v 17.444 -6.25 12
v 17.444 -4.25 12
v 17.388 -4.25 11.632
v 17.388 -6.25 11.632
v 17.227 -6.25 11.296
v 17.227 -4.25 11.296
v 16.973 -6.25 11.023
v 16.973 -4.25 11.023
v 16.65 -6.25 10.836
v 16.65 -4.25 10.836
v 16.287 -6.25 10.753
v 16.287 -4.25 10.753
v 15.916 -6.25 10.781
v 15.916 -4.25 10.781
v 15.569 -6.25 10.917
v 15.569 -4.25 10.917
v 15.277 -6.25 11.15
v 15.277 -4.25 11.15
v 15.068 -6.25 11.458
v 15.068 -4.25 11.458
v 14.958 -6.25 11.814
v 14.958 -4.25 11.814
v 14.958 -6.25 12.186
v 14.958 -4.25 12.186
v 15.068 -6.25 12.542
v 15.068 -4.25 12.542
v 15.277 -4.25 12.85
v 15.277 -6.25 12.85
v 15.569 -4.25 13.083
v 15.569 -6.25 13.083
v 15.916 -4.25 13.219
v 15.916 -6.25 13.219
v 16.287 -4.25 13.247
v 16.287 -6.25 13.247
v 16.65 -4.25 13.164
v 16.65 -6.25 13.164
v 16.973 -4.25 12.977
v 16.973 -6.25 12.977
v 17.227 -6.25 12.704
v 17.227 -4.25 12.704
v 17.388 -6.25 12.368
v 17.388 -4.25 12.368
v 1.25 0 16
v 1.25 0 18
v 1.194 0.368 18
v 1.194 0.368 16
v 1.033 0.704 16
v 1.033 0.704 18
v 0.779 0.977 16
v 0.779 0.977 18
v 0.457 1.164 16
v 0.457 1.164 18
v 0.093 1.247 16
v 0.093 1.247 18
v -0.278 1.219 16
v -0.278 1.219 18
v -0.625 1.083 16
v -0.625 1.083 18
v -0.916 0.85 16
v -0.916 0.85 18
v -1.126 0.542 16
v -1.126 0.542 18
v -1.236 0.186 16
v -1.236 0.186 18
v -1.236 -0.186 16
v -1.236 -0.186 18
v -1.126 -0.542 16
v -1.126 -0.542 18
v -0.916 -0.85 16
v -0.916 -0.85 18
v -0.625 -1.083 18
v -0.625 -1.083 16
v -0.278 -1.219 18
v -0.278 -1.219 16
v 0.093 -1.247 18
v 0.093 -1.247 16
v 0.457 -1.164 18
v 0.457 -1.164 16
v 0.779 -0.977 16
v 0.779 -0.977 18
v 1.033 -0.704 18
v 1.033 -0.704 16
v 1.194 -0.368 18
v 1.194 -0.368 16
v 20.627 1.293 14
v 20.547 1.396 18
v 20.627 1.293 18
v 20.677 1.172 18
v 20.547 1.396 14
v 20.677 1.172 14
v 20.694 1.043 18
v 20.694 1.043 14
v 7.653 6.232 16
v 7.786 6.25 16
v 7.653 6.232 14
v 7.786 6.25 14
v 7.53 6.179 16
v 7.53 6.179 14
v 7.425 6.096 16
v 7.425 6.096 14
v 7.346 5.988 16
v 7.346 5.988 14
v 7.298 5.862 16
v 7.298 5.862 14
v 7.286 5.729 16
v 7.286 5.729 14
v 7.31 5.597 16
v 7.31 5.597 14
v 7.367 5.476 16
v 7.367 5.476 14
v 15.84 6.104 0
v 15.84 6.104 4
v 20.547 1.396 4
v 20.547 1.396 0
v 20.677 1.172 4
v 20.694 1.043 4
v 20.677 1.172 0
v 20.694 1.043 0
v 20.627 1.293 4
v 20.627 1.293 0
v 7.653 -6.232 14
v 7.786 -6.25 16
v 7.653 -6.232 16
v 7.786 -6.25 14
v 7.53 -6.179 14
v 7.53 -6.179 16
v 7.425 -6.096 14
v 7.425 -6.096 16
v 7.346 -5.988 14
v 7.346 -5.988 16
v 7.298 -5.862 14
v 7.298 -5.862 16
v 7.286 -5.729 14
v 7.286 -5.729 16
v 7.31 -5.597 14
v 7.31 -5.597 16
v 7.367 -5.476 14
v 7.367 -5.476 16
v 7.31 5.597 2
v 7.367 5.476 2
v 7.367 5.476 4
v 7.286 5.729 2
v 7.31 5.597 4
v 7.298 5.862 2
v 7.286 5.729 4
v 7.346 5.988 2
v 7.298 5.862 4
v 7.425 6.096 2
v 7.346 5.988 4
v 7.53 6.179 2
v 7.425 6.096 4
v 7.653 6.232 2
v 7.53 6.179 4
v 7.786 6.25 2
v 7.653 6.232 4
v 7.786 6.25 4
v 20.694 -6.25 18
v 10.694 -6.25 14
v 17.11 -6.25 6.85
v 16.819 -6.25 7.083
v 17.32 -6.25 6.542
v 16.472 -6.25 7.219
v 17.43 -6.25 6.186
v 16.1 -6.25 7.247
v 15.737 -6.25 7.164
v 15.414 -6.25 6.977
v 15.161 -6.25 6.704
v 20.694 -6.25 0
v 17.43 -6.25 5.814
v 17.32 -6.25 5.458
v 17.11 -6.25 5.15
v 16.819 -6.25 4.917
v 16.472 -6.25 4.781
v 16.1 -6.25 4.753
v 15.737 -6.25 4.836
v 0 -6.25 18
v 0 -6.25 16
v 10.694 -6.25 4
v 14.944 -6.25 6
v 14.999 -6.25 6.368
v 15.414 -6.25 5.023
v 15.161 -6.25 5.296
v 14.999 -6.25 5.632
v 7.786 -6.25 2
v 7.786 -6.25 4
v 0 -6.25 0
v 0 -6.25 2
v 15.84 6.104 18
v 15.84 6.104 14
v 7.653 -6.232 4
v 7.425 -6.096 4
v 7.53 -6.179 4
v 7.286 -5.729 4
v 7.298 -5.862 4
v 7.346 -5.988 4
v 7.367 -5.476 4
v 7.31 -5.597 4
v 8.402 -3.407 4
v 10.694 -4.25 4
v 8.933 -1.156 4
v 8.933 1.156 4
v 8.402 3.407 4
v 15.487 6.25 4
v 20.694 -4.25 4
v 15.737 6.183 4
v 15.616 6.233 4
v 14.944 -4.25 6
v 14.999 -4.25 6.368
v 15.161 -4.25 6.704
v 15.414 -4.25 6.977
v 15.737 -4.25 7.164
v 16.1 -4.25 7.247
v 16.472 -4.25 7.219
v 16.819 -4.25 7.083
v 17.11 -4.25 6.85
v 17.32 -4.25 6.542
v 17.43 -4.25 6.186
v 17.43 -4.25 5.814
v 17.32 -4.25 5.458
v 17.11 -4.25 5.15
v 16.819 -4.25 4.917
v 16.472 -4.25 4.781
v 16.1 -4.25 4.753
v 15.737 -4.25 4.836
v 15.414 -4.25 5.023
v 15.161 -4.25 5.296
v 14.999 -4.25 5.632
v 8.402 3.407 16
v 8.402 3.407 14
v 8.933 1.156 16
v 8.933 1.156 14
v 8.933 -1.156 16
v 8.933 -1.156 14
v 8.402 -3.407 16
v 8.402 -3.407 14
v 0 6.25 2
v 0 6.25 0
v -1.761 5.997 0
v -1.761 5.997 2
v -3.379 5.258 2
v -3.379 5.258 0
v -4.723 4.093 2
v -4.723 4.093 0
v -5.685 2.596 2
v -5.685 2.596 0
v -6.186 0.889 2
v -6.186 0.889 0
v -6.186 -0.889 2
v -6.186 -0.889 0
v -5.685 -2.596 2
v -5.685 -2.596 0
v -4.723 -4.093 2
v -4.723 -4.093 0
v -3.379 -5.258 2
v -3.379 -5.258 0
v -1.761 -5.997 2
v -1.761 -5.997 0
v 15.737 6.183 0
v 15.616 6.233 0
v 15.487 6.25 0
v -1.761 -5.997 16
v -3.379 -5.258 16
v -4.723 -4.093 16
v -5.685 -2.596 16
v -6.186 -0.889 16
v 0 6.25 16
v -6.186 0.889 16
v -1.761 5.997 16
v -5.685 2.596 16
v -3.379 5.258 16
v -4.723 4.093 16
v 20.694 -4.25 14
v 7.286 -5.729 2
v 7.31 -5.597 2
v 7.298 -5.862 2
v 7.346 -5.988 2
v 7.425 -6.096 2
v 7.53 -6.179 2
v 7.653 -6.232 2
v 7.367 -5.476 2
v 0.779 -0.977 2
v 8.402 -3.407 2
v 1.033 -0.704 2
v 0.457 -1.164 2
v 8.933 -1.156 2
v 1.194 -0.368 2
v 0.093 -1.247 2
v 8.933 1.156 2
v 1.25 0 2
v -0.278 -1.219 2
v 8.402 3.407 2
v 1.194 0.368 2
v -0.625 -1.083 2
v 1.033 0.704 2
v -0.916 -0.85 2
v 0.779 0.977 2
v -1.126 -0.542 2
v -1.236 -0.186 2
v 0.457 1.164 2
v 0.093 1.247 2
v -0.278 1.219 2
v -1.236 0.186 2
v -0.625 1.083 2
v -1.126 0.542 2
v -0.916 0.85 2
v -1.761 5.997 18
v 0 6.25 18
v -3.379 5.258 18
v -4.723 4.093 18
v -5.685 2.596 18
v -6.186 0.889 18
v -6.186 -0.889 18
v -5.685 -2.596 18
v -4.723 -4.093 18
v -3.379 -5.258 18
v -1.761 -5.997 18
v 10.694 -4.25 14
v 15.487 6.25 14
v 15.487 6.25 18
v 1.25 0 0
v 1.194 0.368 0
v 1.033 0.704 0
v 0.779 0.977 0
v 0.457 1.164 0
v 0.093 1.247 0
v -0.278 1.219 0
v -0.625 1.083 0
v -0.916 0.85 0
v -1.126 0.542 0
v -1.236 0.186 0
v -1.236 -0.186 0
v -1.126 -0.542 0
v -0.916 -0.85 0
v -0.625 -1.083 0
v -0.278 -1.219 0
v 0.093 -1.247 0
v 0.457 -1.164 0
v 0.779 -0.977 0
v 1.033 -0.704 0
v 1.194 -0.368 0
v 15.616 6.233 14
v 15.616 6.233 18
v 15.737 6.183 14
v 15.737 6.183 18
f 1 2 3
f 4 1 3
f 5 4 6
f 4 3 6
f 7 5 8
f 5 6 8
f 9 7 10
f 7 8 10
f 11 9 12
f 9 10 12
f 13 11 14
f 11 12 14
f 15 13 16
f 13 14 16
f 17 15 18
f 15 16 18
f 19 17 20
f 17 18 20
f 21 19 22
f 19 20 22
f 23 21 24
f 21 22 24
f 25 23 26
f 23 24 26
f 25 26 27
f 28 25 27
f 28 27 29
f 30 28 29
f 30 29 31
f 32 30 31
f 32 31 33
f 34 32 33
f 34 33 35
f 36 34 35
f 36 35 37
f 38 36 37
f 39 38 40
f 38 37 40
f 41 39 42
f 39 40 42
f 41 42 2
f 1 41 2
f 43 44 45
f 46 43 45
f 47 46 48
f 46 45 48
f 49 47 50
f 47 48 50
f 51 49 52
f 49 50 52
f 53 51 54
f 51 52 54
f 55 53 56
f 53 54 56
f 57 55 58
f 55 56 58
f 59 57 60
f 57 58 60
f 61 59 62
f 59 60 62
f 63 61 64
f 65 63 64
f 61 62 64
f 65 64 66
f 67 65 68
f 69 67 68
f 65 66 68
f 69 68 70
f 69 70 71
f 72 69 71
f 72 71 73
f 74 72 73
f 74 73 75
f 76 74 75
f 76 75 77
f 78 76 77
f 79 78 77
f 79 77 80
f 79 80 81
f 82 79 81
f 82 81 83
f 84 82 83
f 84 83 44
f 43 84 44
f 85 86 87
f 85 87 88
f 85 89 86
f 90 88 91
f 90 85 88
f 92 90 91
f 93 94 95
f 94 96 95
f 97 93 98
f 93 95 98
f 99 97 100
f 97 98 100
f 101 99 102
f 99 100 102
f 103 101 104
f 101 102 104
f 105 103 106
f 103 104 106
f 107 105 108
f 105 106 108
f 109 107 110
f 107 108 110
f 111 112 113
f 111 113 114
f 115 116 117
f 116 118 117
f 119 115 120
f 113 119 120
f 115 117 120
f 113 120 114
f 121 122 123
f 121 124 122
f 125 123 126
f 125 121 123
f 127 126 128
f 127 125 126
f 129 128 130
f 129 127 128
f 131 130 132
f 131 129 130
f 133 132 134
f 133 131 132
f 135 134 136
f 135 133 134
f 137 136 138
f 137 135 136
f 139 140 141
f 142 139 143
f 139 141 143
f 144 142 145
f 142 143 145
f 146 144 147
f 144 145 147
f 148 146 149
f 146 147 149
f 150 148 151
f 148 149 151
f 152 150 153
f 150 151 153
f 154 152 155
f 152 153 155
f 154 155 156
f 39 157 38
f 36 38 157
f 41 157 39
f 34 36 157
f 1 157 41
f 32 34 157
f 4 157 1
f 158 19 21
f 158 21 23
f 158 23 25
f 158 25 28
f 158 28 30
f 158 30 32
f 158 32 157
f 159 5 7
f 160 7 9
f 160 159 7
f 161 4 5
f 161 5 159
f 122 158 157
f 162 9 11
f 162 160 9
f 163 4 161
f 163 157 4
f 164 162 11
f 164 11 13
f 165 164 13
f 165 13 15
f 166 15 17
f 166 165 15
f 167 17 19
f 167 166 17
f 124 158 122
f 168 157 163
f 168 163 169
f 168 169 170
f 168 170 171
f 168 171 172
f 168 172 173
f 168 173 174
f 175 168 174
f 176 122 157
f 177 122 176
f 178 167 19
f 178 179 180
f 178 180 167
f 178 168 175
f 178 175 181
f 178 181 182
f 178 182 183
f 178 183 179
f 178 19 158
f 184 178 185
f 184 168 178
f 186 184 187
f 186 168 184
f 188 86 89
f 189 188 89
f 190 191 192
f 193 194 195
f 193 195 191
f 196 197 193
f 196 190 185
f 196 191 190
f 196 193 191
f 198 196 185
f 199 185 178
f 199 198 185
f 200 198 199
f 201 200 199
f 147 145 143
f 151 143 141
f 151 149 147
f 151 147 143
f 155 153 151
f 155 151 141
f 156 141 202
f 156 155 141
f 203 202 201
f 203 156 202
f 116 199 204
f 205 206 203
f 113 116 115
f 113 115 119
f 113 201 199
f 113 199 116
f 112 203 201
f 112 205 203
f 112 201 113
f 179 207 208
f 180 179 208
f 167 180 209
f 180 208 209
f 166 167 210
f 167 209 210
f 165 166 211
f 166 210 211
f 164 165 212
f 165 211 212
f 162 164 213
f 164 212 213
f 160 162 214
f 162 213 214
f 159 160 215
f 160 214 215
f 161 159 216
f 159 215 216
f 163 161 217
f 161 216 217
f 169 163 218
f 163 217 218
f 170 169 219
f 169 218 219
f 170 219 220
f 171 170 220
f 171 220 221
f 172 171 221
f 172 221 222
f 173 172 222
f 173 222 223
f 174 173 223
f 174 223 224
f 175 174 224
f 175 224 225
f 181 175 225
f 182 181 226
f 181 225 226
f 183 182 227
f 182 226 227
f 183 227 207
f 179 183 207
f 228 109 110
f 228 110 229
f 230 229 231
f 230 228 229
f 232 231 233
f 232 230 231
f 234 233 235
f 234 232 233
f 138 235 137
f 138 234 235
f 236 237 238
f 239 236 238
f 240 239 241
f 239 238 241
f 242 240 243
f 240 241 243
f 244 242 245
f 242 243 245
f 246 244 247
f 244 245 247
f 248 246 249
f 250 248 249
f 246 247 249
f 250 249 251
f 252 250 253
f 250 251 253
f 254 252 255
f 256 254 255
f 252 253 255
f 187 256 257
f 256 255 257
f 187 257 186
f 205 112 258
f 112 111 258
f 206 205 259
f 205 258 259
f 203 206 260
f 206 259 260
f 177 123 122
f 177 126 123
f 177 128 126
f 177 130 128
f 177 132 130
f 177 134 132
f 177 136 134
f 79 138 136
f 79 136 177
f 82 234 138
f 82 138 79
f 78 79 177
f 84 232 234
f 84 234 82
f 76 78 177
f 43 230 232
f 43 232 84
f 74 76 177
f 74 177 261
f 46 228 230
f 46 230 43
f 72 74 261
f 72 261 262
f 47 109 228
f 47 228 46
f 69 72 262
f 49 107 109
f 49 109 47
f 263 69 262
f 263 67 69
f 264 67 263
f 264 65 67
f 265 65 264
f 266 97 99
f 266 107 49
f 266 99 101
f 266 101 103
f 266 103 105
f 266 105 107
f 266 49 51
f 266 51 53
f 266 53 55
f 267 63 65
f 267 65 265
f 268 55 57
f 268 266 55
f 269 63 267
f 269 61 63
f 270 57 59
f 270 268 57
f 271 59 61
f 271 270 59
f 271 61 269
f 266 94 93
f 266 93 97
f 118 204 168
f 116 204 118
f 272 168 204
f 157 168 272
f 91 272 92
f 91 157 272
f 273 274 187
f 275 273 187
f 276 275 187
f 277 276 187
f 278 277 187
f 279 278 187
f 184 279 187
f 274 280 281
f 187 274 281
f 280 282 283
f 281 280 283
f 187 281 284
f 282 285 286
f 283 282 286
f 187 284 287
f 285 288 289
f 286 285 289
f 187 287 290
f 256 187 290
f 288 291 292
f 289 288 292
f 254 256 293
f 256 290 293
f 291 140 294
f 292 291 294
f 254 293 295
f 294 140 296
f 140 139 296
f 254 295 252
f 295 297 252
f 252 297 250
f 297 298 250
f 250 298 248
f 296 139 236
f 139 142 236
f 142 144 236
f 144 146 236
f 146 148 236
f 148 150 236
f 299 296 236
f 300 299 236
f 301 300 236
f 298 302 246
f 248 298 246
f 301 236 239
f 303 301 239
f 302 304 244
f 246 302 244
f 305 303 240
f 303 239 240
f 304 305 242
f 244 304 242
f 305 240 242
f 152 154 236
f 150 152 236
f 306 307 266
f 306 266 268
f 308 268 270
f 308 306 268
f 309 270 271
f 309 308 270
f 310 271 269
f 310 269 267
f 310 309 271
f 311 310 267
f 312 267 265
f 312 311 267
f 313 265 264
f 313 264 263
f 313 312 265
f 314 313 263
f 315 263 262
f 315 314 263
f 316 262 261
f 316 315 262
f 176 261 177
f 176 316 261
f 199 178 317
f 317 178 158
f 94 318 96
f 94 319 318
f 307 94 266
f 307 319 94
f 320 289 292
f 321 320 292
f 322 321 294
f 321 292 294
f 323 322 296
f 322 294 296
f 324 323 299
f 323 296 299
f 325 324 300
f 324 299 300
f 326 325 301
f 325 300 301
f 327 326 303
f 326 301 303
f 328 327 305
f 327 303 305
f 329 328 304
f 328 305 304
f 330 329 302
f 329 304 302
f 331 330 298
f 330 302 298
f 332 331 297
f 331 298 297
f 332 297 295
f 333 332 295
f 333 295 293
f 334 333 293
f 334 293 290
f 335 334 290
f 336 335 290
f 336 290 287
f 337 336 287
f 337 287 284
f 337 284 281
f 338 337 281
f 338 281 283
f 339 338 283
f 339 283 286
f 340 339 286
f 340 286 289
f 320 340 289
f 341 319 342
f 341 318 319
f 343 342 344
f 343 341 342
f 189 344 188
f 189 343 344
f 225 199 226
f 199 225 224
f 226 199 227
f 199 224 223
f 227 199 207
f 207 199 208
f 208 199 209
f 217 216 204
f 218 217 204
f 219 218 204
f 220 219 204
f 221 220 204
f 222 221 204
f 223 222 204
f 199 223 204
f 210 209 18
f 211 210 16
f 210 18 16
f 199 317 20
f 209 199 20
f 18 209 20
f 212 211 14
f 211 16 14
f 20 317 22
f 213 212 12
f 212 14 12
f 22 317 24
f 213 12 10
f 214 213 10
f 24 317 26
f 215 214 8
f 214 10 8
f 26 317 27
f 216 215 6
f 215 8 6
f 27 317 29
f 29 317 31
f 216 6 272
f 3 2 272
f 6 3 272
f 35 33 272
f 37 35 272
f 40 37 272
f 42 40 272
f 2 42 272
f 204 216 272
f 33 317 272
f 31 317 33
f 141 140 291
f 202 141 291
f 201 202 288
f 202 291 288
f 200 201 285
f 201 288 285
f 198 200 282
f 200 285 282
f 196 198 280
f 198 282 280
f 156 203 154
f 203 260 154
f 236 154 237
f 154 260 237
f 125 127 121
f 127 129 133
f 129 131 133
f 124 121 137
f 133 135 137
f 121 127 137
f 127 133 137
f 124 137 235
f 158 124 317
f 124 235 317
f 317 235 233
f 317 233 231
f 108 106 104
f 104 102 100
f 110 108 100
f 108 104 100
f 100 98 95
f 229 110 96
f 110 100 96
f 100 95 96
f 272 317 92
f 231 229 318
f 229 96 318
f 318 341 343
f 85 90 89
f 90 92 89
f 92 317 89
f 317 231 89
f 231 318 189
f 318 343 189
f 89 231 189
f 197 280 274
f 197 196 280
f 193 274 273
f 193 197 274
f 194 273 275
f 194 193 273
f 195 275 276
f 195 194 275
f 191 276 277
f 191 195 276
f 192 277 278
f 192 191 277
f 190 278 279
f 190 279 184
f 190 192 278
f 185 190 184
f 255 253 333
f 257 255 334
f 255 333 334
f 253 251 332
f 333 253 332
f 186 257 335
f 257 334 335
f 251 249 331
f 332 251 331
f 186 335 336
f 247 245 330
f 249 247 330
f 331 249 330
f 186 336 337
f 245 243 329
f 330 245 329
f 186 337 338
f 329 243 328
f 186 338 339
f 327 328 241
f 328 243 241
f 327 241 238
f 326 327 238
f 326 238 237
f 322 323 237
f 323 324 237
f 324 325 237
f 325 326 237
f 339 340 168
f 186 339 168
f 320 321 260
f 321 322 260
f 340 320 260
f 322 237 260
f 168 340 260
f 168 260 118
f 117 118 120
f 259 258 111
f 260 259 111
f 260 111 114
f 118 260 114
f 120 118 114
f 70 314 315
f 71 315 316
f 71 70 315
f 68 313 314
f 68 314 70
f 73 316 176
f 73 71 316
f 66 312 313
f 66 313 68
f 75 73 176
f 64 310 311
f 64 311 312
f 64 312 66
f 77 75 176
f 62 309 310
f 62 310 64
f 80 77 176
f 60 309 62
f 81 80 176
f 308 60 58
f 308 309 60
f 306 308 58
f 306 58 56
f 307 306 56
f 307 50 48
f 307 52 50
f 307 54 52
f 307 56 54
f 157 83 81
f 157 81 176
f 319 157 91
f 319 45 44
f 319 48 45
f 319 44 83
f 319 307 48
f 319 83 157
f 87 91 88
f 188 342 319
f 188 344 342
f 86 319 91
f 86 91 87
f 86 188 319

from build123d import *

# Parameters (mm, degrees)
BOSS_EXTRUDE1_DEPTH  = 4
BOSS_EXTRUDE7_DEPTH  = 4
SKETCH9_W            = 20
SKETCH9_H            = 36
BOSS_EXTRUDE8_DEPTH  = 4
BOSS_EXTRUDE9_DEPTH  = 8
BOSS_EXTRUDE10_DEPTH = 4
FILLET4_R            = 1
SKETCH11_R           = 2.5
CUT_EXTRUDE2_DEPTH   = 57.25989309
CHAMFER1_SIZE        = 10
SKETCH12_R           = 2.5
CUT_EXTRUDE3_DEPTH   = 4
FILLET5_R            = 1
SCALE1_SCALE         = 0.5


with BuildPart() as part:
    # Sketch1 → Boss-Extrude1 (new body)
    with BuildSketch(Plane.XY):
        with BuildLine():
            ThreePointArc((0, 12.5), (-12.5, 0), (0, -12.5))
            Line((0, -12.5), (26.387505004, -12.5))
            ThreePointArc((26.387505004, -12.5), (22, 0), (26.387505004, 12.5))
            Line((26.387505004, 12.5), (0, 12.5))
        make_face()
    extrude(amount=BOSS_EXTRUDE1_DEPTH)

    # Sketch8 → Boss-Extrude7 (add)
    with BuildSketch(Plane(origin=(0, 0, 0), x_dir=(-1, 0, 0), z_dir=(0, 0, -1))):
        with BuildLine():
            Line((-26.387505004, 12.5), (-41.387505004, 12.5))
            Line((-41.387505004, 12.5), (-41.387505004, -12.5))
            Line((-41.387505004, -12.5), (-26.387505004, -12.5))
            ThreePointArc((-26.387505004, -12.5), (-22, 0), (-26.387505004, 12.5))
        make_face()
    extrude(amount=-BOSS_EXTRUDE7_DEPTH)


with BuildPart() as body_2:
    # Mirror3: mirrored copy
    add(part.part.mirror(Plane.XY.offset(18)))


with BuildPart() as part_1:
    add(part.part)

    add(body_2.part)  # Boss-Extrude8 merges body 2
    # Sketch9 → Boss-Extrude8 (add)
    with BuildSketch(Plane.XZ.offset(12.5)):
        with Locations((31.387505004, 18)):
            Rectangle(SKETCH9_W, SKETCH9_H)
    extrude(amount=-BOSS_EXTRUDE8_DEPTH)

    # Sketch1<4> → Boss-Extrude9 (add)
    with BuildSketch(Plane.XY):
        with BuildLine():
            ThreePointArc((13.612494996, 12.5), (18, 0), (13.612494996, -12.5))
            Line((13.612494996, -12.5), (40, -12.5))
            ThreePointArc((40, -12.5), (27.5, 0), (40, 12.5))
            Line((40, 12.5), (13.612494996, 12.5))
        make_face()
    boss_extrude9 = extrude(amount=BOSS_EXTRUDE9_DEPTH)

    # Sketch10 → Boss-Extrude10 (add)
    with BuildSketch(Plane.XY.offset(4)):
        with BuildLine():
            Line((41.387505004, 12.5), (40, 12.5))
            ThreePointArc((40, 12.5), (28.543560763, 5), (30.83484861, -8.5))
            Line((30.83484861, -8.5), (41.387505004, -8.5))
            Line((41.387505004, -8.5), (41.387505004, 12.5))
        make_face()
    boss_extrude10 = extrude(amount=BOSS_EXTRUDE10_DEPTH)

    # Mirror4: Boss-Extrude9, Boss-Extrude10 across plane
    add(boss_extrude9.mirror(Plane.XY.offset(18)))
    add(boss_extrude10.mirror(Plane.XY.offset(18)))

    # Fillet4
    fillet4_edges = [part_1.edges().sort_by_distance(p)[0] for p in [
        (13.612494996, -12.5, 30),
        (13.612494996, 12.5, 30),
        (13.612494996, -12.5, 6),
        (13.612494996, 12.5, 6),
    ]]
    fillet(fillet4_edges, radius=FILLET4_R)

    # Sketch11 → Cut-Extrude2 (cut, through all)
    with BuildSketch(Plane.XY.offset(36)):
        Circle(SKETCH11_R)
    extrude(amount=-CUT_EXTRUDE2_DEPTH, mode=Mode.SUBTRACT)

    # Chamfer1
    chamfer1_edges = [part_1.edges().sort_by_distance(p)[0] for p in [
        (41.387505004, 12.5, 32),
        (41.387505004, 12.5, 4),
    ]]
    chamfer(chamfer1_edges, length=CHAMFER1_SIZE)

    # Sketch12 → Cut-Extrude3 (cut)
    with BuildSketch(Plane(origin=(0, -8.5, 0), x_dir=(1, 0, 0), z_dir=(0, 1, 0))):
        with Locations((32.387505004, -12)):
            Circle(SKETCH12_R)
        with Locations((32.387505004, -24)):
            Circle(SKETCH12_R)
    extrude(amount=-CUT_EXTRUDE3_DEPTH, mode=Mode.SUBTRACT)

    # Fillet5
    fillet5_edges = [part_1.edges().sort_by_distance(p)[0] for p in [
        (41.387505004, 2.5, 32),
        (41.387505004, 2.5, 4),
        (31.387505004, 12.5, 4),
        (31.387505004, 12.5, 32),
    ]]
    fillet(fillet5_edges, radius=FILLET5_R)


with BuildPart() as part_2:
    # Scale1: scaled about (0, 0, 0)
    add(part_1.part.scale(SCALE1_SCALE))


solid = part_2.part
